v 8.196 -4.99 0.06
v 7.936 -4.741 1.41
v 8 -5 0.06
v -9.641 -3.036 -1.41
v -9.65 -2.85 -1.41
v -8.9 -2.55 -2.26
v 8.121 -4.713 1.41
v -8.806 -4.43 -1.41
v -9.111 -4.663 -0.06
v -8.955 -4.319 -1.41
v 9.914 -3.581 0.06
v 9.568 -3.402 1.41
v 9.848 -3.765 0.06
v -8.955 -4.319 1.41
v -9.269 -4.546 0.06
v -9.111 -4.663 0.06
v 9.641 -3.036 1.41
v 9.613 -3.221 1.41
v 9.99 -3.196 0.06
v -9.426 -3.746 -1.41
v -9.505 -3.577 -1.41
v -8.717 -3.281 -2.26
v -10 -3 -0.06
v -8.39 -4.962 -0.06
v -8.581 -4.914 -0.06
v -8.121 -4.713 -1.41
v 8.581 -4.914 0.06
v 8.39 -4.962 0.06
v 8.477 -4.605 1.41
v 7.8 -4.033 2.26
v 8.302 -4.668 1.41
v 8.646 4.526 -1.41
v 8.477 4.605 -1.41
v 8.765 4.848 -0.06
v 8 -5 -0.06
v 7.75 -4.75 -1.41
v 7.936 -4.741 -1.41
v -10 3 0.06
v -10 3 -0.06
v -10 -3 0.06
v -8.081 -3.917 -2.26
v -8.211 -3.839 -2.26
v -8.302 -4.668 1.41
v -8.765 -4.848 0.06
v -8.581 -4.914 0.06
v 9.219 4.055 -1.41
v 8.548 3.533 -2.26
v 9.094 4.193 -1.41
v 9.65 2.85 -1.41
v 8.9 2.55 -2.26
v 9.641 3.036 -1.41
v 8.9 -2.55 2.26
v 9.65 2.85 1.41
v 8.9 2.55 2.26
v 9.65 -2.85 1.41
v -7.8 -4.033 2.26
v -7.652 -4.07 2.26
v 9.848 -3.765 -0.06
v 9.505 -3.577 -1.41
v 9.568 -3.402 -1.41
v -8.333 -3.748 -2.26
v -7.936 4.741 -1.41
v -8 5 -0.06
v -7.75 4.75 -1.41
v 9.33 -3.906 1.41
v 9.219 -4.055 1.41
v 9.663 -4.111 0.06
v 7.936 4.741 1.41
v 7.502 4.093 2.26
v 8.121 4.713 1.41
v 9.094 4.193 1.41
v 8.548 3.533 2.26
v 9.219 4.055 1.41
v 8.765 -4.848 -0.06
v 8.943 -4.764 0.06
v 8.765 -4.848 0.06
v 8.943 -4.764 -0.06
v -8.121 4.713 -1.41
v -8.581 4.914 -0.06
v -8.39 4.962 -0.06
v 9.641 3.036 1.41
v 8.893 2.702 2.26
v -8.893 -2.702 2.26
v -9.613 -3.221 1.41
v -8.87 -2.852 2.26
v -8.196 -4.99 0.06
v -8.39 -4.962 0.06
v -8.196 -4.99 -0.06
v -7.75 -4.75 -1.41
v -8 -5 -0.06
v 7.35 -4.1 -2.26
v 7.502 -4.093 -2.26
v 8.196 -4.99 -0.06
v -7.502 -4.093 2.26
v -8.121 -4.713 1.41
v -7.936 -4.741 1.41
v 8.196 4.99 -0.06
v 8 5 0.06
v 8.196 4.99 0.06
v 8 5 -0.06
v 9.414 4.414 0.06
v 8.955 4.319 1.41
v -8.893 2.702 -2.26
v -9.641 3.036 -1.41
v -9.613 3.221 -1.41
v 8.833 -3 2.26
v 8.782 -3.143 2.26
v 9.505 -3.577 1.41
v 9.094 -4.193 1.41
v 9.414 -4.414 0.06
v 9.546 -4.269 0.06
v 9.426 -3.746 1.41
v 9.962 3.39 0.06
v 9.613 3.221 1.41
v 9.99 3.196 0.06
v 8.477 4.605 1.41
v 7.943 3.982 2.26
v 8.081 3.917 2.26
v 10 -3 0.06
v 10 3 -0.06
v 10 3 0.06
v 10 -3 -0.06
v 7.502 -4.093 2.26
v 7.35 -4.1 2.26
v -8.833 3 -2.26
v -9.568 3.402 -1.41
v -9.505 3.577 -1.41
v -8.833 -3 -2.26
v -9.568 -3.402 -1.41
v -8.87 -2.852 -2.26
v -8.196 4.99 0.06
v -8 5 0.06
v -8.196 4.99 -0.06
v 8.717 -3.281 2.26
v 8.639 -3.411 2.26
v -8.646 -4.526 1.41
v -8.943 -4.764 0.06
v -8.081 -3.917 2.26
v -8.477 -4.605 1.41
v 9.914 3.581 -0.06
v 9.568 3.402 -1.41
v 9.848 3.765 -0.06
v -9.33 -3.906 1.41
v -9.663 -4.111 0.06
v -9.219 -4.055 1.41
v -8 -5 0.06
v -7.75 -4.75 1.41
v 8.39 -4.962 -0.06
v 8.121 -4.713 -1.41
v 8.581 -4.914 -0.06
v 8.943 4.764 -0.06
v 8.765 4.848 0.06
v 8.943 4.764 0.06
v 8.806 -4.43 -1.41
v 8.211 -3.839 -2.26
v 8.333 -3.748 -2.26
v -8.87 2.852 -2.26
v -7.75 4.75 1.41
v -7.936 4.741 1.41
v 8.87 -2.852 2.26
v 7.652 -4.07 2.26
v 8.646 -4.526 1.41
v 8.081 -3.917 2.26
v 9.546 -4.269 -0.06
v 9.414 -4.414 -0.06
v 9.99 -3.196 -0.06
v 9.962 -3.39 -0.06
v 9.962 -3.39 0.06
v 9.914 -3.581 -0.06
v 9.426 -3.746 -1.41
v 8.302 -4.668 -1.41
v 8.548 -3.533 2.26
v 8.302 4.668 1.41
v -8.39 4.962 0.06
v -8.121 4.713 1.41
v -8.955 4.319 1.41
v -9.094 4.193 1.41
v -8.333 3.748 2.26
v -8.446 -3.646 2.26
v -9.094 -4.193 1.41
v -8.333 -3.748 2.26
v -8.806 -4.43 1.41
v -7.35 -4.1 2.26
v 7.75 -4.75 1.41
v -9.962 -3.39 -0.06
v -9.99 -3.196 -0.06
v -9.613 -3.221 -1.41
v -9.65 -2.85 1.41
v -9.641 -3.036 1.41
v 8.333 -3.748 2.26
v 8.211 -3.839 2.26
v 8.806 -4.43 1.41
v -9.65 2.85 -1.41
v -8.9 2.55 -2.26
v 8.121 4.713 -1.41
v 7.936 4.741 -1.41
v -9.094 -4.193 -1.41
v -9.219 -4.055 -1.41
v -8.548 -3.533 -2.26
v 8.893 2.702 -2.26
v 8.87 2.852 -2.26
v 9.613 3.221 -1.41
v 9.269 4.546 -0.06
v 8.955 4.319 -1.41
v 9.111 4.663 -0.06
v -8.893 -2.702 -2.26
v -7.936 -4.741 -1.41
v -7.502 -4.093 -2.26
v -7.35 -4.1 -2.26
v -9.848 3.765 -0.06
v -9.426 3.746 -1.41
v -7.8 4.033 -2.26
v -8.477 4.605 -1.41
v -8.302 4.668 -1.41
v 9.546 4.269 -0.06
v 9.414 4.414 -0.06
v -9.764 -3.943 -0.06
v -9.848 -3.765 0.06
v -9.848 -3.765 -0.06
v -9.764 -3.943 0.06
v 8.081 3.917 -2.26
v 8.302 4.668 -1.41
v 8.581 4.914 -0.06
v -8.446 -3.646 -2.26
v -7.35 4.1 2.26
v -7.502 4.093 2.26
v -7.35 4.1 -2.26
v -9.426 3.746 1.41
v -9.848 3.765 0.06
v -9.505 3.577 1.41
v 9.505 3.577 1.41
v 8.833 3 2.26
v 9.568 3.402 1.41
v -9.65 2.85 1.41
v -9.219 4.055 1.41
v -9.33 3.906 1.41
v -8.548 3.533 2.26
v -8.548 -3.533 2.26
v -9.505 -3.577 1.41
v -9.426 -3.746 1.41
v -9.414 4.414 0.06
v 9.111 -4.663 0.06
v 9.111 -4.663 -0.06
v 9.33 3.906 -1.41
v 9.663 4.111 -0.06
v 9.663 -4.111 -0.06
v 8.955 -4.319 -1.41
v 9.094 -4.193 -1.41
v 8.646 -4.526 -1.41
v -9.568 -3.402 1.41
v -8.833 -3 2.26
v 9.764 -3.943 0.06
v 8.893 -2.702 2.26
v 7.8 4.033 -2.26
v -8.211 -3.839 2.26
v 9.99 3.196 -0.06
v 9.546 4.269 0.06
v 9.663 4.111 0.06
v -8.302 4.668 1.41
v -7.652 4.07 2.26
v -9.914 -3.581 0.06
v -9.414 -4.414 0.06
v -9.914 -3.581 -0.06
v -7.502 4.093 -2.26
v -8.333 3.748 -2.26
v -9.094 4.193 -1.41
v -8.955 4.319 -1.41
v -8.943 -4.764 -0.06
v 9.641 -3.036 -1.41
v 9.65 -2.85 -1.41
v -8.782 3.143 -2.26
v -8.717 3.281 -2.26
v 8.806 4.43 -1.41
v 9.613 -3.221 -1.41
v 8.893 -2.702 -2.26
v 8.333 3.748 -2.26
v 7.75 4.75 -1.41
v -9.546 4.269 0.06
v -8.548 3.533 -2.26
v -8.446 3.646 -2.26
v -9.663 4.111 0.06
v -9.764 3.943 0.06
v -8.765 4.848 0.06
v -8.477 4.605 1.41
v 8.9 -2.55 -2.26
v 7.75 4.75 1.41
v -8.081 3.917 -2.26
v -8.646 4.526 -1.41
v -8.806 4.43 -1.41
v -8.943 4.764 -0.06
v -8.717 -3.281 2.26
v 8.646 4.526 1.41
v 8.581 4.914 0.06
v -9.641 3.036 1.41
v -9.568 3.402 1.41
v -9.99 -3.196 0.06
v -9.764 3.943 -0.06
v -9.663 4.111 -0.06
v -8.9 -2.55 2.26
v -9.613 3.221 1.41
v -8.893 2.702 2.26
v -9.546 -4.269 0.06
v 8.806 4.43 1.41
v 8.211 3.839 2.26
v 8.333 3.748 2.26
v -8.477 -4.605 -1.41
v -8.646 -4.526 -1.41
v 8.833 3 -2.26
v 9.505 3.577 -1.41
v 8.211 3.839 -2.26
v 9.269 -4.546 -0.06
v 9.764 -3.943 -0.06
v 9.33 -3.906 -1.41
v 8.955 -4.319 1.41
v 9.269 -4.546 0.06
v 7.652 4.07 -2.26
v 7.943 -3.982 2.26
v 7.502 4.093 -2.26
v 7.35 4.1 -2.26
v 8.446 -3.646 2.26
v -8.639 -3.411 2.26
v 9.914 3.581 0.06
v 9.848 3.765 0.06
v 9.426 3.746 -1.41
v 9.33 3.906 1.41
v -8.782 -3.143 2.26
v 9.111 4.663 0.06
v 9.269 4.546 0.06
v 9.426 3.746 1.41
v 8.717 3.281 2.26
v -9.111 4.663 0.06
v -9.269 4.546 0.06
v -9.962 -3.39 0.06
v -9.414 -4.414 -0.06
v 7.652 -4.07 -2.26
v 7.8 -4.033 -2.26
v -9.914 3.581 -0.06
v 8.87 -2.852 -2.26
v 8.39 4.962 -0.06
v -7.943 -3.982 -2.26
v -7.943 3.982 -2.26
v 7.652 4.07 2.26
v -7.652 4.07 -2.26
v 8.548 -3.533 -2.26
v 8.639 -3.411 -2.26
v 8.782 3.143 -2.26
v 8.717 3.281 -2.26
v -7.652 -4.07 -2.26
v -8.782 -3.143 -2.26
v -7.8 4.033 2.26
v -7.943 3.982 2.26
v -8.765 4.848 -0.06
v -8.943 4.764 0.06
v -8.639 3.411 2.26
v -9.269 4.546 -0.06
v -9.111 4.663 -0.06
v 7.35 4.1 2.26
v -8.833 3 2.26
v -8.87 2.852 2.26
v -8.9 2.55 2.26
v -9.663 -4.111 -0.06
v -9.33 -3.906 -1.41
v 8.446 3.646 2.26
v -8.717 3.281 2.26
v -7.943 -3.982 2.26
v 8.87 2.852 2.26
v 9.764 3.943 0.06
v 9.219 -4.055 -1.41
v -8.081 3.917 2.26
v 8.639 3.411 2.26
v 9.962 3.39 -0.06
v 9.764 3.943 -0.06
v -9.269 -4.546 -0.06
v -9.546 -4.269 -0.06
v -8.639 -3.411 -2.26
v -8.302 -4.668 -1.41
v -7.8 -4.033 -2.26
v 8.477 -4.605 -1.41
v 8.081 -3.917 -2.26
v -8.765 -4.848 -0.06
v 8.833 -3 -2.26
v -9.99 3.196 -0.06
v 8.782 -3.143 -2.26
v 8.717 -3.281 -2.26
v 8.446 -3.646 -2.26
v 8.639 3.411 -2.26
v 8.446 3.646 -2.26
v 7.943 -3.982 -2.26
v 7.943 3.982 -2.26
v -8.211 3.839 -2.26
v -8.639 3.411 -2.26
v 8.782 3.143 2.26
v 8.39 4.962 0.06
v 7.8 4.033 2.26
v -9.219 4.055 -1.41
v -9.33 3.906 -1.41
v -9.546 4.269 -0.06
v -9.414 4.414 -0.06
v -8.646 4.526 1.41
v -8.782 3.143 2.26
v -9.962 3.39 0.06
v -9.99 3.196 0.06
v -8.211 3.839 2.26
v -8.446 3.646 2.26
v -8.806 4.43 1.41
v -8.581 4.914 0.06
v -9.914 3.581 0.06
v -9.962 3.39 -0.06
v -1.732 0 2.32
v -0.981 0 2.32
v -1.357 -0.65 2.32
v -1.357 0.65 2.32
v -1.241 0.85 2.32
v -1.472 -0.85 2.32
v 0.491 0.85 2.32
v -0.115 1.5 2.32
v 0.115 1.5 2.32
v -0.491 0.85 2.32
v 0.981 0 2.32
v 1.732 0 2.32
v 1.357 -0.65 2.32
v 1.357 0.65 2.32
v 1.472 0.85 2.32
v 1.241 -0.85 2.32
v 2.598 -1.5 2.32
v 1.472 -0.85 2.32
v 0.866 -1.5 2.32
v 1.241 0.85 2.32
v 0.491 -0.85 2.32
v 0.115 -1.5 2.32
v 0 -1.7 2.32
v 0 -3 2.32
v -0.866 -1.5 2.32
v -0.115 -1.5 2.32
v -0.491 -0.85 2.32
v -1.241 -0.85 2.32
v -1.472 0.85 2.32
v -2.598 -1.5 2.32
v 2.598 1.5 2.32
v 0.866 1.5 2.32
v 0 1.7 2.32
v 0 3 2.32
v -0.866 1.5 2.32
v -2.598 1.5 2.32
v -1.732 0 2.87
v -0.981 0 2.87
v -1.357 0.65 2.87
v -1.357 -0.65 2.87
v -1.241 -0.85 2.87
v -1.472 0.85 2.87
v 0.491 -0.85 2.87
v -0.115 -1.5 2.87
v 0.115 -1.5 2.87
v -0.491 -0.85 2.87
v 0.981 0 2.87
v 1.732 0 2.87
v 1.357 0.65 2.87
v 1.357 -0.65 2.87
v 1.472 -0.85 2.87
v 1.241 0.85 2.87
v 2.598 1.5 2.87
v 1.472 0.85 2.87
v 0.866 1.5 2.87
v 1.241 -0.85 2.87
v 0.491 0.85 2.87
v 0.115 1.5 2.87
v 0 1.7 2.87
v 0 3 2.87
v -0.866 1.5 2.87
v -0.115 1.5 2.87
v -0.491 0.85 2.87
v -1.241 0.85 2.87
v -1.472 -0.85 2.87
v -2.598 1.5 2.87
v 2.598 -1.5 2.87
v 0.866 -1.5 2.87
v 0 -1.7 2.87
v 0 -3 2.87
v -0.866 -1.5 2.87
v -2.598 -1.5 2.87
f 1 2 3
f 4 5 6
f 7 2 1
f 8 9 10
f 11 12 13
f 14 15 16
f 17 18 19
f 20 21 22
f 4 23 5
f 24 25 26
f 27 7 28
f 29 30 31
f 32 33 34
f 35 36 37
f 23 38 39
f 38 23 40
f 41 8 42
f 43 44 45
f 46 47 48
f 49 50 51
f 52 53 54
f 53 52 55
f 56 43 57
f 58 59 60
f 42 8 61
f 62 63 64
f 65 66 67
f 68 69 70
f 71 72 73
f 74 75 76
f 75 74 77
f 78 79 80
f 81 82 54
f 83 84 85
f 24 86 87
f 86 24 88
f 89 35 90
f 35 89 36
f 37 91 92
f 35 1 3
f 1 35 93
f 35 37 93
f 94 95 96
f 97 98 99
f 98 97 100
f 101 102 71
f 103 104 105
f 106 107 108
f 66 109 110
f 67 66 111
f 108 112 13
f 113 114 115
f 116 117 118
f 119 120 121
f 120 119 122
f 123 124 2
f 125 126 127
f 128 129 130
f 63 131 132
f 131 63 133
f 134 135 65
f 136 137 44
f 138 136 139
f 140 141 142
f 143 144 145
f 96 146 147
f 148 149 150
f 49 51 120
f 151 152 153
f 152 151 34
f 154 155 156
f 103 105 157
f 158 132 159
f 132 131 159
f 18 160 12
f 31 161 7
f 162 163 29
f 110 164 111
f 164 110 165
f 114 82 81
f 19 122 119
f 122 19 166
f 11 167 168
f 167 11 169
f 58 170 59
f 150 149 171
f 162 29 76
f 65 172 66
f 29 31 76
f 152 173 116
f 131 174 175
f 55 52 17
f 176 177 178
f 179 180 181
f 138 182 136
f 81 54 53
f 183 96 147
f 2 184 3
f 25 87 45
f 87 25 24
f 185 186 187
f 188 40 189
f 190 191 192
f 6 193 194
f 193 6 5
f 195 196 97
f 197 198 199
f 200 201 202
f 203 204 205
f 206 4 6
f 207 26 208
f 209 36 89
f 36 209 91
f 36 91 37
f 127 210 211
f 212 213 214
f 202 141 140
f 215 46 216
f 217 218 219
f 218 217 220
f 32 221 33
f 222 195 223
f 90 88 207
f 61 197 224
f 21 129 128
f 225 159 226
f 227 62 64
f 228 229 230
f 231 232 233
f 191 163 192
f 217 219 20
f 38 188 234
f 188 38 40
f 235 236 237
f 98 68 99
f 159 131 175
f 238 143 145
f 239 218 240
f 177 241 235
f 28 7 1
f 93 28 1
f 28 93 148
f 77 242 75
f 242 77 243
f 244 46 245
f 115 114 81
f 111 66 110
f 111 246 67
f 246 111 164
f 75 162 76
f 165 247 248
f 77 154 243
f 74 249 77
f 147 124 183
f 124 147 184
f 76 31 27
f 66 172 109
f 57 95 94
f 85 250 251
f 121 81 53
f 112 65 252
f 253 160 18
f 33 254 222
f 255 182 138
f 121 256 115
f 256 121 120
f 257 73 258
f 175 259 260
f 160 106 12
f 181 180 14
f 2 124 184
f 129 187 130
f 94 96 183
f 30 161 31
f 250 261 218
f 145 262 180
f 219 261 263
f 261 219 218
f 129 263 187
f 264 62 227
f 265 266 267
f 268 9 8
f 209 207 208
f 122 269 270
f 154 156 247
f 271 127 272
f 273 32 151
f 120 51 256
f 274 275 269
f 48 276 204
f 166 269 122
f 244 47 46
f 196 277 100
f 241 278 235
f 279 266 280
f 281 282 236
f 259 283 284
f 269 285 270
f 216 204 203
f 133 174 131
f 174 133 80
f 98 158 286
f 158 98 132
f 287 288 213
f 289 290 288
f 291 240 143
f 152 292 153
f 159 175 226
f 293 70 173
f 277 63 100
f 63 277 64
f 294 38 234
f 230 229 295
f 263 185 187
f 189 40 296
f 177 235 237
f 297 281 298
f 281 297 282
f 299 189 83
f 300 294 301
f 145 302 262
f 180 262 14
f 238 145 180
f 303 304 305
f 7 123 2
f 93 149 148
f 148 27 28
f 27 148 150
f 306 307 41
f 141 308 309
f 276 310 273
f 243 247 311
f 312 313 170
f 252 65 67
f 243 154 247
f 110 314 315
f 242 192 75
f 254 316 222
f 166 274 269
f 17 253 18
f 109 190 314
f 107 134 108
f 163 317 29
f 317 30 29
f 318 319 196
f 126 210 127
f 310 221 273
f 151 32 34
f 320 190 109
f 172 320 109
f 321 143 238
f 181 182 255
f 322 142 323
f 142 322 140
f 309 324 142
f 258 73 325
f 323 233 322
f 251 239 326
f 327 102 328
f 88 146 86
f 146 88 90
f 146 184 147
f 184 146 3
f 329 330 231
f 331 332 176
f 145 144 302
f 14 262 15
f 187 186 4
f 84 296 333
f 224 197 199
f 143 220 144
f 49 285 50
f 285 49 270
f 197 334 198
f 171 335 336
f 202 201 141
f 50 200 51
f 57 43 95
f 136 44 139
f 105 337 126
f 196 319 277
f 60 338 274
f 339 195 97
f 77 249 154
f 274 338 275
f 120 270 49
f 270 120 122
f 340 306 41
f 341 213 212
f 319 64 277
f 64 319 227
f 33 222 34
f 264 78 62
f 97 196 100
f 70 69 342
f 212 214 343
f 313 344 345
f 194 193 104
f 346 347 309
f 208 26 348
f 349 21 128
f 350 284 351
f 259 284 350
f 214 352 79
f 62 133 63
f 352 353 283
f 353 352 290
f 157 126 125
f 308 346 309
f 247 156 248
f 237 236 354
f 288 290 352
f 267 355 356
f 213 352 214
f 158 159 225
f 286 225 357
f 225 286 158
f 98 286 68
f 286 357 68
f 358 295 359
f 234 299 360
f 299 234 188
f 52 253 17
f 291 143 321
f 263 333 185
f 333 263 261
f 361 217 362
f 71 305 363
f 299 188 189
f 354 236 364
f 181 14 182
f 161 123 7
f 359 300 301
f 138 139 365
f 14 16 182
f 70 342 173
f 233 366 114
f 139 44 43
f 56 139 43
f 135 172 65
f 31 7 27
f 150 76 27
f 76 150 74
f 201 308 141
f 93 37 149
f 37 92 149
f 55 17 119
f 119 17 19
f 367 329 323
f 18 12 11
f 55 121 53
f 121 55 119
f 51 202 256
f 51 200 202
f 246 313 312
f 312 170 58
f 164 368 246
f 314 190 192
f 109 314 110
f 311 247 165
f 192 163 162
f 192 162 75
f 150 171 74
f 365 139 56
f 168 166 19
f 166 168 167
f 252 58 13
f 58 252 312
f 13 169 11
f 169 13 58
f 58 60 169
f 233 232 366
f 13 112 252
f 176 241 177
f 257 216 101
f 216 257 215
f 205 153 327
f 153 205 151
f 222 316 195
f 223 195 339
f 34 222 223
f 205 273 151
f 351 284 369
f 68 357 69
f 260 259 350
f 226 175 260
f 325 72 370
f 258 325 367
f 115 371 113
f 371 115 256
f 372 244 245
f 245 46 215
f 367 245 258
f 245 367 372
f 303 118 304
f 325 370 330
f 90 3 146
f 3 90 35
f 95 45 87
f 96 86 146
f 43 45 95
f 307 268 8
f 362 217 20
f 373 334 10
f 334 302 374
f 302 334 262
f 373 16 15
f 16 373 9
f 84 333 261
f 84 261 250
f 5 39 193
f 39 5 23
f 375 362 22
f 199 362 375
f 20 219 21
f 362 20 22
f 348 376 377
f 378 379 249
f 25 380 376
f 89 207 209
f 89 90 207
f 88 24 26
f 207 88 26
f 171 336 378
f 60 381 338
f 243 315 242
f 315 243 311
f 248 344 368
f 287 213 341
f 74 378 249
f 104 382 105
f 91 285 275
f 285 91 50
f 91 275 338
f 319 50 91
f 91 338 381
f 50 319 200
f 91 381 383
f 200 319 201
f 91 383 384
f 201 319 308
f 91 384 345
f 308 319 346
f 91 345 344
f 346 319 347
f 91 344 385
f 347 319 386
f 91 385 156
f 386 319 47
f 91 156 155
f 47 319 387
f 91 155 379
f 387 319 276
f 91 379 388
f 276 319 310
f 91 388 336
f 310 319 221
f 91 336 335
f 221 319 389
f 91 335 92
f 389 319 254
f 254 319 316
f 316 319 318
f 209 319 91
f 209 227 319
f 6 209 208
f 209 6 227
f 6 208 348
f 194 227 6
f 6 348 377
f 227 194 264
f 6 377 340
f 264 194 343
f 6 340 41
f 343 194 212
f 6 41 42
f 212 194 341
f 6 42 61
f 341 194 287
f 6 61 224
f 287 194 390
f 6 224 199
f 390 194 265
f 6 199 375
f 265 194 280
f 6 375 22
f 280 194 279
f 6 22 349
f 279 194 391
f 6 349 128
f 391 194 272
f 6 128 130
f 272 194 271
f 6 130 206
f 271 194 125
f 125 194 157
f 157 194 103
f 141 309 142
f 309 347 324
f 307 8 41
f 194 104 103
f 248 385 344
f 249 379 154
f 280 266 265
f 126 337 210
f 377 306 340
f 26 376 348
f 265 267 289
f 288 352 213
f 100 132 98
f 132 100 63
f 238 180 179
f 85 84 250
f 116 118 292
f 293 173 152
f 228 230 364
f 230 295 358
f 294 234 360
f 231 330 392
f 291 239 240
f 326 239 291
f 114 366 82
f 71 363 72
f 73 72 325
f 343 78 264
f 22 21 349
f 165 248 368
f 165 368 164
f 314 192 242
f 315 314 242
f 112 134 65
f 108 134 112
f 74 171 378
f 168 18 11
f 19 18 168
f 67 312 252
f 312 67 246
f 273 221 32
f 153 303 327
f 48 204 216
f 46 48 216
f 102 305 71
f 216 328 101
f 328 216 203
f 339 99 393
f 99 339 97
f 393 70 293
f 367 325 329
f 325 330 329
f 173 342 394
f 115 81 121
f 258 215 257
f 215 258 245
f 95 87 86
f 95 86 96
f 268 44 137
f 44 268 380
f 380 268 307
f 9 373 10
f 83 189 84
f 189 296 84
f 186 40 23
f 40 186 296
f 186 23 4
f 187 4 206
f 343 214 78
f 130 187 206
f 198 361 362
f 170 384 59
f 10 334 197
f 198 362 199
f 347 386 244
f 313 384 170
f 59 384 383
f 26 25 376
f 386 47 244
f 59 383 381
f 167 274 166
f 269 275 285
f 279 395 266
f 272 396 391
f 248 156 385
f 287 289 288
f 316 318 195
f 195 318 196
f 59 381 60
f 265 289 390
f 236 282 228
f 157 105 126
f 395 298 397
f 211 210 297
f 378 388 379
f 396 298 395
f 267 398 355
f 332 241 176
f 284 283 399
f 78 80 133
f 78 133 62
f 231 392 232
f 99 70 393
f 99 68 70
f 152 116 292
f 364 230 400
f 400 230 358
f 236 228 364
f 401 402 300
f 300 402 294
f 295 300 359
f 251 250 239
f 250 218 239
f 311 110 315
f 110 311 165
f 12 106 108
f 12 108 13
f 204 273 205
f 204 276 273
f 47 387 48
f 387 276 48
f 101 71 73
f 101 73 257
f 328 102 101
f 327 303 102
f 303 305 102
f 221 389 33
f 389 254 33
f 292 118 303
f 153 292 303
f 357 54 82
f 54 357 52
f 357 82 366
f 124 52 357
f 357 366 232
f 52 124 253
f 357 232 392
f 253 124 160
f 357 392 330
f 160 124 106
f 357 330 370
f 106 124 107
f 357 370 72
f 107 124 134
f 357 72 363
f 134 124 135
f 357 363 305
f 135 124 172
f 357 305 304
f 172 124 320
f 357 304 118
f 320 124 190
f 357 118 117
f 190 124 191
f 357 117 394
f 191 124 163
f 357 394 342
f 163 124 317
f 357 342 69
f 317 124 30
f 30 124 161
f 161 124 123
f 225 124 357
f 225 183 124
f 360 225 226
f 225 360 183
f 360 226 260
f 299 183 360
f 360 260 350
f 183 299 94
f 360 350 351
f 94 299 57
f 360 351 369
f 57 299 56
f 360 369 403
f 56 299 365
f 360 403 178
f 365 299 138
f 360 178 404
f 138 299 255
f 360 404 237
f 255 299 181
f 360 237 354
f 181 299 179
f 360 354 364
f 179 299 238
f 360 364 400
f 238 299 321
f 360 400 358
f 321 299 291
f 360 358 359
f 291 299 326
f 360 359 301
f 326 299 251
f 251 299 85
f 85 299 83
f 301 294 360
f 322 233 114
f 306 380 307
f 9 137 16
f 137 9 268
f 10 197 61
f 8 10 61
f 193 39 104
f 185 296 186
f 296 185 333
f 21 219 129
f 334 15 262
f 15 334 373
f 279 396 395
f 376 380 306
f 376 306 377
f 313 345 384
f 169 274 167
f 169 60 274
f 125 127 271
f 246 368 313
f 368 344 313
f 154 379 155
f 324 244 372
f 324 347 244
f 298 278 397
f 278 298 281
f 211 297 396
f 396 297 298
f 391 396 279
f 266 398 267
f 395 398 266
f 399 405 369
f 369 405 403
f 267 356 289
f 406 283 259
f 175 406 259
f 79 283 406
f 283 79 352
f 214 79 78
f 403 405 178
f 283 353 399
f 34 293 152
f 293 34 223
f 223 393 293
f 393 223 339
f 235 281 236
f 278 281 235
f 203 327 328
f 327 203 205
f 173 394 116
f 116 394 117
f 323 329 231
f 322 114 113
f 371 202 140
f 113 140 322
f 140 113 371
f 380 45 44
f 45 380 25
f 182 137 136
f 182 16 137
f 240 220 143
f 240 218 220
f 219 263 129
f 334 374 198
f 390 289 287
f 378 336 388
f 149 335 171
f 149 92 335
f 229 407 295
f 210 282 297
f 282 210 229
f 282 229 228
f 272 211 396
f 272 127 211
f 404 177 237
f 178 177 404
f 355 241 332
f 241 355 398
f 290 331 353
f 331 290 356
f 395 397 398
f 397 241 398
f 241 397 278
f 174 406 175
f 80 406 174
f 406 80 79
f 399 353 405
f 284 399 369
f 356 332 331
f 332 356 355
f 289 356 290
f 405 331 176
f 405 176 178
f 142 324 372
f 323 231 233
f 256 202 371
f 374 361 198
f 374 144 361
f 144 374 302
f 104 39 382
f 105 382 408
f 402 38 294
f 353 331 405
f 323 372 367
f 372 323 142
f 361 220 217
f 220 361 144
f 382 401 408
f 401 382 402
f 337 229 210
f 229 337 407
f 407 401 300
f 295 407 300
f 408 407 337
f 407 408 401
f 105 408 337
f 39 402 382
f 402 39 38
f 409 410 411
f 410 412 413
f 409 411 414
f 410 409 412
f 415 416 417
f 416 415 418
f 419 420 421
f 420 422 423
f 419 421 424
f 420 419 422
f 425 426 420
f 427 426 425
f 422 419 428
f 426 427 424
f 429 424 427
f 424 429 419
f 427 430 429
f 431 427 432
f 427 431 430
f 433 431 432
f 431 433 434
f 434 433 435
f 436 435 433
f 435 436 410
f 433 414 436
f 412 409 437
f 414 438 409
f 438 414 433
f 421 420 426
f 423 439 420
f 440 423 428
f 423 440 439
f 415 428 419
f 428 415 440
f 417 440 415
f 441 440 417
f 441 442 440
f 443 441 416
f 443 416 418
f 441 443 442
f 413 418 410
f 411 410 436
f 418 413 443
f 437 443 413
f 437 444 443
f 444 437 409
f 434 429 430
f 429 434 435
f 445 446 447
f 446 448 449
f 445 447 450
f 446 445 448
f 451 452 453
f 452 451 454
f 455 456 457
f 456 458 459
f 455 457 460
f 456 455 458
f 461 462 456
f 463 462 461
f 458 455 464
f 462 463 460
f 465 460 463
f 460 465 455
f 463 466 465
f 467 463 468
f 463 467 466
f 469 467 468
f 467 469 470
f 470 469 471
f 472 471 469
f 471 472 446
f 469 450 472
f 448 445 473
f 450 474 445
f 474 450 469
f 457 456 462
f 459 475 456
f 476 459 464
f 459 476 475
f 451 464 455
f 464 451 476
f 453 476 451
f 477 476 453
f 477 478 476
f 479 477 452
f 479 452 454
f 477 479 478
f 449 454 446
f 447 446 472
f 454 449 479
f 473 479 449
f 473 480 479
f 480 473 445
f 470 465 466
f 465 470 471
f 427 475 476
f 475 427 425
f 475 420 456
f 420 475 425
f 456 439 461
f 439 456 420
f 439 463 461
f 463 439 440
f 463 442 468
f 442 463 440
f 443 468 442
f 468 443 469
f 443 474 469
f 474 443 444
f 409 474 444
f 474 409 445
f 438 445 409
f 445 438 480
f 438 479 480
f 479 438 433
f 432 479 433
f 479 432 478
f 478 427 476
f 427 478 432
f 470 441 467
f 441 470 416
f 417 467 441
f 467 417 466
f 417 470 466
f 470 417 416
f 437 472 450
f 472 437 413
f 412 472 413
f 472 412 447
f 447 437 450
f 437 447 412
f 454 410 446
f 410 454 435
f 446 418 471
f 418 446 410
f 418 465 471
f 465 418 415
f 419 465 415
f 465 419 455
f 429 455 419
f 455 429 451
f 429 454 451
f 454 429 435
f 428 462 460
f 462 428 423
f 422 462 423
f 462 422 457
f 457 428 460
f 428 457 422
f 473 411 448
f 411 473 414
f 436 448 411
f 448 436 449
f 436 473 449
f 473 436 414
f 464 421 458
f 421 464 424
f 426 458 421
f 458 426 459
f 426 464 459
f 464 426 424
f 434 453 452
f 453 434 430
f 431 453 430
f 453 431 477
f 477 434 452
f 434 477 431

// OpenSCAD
// Mini pillow with raised Star of David
// Approximate footprint: 20 x 10 mm
// Units: millimeters

$fn = 64;

// ========================
// Main dimensions
// ========================
pillow_length = 20;
pillow_width  = 10;
pillow_height = 5.0;

corner_radius = 2.0;

// Star dimensions
star_outer_radius = 3.0;
star_line_width   = 0.65;
star_height       = 0.55;

// ========================
// Rounded 2D rectangle
// ========================
module rounded_rect_2d(w, h, r) {
    offset(r = r)
        square([w - 2*r, h - 2*r], center = true);
}

// Very thin rounded plate used for lofting the pillow
module rounded_slice(z, w, h, r, thickness = 0.12) {
    translate([0, 0, z])
        linear_extrude(height = thickness, center = true)
            rounded_rect_2d(w, h, r);
}

// ========================
// Pillow body
// ========================
// The slices get wider toward the middle and narrower
// near the top/bottom to create a soft stuffed-pillow shape.
module pillow_body() {
    hull() {
        rounded_slice(
            -pillow_height/2 + 0.30,
            pillow_length - 2.2,
            pillow_width  - 1.8,
            corner_radius - 0.45
        );

        rounded_slice(
            -pillow_height/2 + 1.15,
            pillow_length - 0.7,
            pillow_width  - 0.5,
            corner_radius - 0.10
        );

        rounded_slice(
            0,
            pillow_length,
            pillow_width,
            corner_radius
        );

        rounded_slice(
            pillow_height/2 - 1.15,
            pillow_length - 0.7,
            pillow_width  - 0.5,
            corner_radius - 0.10
        );

        rounded_slice(
            pillow_height/2 - 0.30,
            pillow_length - 2.2,
            pillow_width  - 1.8,
            corner_radius - 0.45
        );
    }
}

// ========================
// Star of David
// ========================
function triangle_points(r, rotation = 0) = [
    for (a = [90 + rotation, 210 + rotation, 330 + rotation])
        [r*cos(a), r*sin(a)]
];

module triangle_outline(r, line_w) {
    difference() {
        polygon(points = triangle_points(r));
        offset(delta = -line_w)
            polygon(points = triangle_points(r));
    }
}

module star_of_david_2d(r, line_w) {
    union() {
        triangle_outline(r, line_w);

        rotate(180)
            triangle_outline(r, line_w);
    }
}

module star_of_david() {
    translate([
        0,
        0,
        pillow_height/2 - 0.18
    ])
        linear_extrude(height = star_height)
            star_of_david_2d(star_outer_radius, star_line_width);
}

// ========================
// Final model
// ========================
union() {
    color([0.82, 0.82, 0.82])
        pillow_body();

    color([0.15, 0.25, 0.65])
        star_of_david();
}
